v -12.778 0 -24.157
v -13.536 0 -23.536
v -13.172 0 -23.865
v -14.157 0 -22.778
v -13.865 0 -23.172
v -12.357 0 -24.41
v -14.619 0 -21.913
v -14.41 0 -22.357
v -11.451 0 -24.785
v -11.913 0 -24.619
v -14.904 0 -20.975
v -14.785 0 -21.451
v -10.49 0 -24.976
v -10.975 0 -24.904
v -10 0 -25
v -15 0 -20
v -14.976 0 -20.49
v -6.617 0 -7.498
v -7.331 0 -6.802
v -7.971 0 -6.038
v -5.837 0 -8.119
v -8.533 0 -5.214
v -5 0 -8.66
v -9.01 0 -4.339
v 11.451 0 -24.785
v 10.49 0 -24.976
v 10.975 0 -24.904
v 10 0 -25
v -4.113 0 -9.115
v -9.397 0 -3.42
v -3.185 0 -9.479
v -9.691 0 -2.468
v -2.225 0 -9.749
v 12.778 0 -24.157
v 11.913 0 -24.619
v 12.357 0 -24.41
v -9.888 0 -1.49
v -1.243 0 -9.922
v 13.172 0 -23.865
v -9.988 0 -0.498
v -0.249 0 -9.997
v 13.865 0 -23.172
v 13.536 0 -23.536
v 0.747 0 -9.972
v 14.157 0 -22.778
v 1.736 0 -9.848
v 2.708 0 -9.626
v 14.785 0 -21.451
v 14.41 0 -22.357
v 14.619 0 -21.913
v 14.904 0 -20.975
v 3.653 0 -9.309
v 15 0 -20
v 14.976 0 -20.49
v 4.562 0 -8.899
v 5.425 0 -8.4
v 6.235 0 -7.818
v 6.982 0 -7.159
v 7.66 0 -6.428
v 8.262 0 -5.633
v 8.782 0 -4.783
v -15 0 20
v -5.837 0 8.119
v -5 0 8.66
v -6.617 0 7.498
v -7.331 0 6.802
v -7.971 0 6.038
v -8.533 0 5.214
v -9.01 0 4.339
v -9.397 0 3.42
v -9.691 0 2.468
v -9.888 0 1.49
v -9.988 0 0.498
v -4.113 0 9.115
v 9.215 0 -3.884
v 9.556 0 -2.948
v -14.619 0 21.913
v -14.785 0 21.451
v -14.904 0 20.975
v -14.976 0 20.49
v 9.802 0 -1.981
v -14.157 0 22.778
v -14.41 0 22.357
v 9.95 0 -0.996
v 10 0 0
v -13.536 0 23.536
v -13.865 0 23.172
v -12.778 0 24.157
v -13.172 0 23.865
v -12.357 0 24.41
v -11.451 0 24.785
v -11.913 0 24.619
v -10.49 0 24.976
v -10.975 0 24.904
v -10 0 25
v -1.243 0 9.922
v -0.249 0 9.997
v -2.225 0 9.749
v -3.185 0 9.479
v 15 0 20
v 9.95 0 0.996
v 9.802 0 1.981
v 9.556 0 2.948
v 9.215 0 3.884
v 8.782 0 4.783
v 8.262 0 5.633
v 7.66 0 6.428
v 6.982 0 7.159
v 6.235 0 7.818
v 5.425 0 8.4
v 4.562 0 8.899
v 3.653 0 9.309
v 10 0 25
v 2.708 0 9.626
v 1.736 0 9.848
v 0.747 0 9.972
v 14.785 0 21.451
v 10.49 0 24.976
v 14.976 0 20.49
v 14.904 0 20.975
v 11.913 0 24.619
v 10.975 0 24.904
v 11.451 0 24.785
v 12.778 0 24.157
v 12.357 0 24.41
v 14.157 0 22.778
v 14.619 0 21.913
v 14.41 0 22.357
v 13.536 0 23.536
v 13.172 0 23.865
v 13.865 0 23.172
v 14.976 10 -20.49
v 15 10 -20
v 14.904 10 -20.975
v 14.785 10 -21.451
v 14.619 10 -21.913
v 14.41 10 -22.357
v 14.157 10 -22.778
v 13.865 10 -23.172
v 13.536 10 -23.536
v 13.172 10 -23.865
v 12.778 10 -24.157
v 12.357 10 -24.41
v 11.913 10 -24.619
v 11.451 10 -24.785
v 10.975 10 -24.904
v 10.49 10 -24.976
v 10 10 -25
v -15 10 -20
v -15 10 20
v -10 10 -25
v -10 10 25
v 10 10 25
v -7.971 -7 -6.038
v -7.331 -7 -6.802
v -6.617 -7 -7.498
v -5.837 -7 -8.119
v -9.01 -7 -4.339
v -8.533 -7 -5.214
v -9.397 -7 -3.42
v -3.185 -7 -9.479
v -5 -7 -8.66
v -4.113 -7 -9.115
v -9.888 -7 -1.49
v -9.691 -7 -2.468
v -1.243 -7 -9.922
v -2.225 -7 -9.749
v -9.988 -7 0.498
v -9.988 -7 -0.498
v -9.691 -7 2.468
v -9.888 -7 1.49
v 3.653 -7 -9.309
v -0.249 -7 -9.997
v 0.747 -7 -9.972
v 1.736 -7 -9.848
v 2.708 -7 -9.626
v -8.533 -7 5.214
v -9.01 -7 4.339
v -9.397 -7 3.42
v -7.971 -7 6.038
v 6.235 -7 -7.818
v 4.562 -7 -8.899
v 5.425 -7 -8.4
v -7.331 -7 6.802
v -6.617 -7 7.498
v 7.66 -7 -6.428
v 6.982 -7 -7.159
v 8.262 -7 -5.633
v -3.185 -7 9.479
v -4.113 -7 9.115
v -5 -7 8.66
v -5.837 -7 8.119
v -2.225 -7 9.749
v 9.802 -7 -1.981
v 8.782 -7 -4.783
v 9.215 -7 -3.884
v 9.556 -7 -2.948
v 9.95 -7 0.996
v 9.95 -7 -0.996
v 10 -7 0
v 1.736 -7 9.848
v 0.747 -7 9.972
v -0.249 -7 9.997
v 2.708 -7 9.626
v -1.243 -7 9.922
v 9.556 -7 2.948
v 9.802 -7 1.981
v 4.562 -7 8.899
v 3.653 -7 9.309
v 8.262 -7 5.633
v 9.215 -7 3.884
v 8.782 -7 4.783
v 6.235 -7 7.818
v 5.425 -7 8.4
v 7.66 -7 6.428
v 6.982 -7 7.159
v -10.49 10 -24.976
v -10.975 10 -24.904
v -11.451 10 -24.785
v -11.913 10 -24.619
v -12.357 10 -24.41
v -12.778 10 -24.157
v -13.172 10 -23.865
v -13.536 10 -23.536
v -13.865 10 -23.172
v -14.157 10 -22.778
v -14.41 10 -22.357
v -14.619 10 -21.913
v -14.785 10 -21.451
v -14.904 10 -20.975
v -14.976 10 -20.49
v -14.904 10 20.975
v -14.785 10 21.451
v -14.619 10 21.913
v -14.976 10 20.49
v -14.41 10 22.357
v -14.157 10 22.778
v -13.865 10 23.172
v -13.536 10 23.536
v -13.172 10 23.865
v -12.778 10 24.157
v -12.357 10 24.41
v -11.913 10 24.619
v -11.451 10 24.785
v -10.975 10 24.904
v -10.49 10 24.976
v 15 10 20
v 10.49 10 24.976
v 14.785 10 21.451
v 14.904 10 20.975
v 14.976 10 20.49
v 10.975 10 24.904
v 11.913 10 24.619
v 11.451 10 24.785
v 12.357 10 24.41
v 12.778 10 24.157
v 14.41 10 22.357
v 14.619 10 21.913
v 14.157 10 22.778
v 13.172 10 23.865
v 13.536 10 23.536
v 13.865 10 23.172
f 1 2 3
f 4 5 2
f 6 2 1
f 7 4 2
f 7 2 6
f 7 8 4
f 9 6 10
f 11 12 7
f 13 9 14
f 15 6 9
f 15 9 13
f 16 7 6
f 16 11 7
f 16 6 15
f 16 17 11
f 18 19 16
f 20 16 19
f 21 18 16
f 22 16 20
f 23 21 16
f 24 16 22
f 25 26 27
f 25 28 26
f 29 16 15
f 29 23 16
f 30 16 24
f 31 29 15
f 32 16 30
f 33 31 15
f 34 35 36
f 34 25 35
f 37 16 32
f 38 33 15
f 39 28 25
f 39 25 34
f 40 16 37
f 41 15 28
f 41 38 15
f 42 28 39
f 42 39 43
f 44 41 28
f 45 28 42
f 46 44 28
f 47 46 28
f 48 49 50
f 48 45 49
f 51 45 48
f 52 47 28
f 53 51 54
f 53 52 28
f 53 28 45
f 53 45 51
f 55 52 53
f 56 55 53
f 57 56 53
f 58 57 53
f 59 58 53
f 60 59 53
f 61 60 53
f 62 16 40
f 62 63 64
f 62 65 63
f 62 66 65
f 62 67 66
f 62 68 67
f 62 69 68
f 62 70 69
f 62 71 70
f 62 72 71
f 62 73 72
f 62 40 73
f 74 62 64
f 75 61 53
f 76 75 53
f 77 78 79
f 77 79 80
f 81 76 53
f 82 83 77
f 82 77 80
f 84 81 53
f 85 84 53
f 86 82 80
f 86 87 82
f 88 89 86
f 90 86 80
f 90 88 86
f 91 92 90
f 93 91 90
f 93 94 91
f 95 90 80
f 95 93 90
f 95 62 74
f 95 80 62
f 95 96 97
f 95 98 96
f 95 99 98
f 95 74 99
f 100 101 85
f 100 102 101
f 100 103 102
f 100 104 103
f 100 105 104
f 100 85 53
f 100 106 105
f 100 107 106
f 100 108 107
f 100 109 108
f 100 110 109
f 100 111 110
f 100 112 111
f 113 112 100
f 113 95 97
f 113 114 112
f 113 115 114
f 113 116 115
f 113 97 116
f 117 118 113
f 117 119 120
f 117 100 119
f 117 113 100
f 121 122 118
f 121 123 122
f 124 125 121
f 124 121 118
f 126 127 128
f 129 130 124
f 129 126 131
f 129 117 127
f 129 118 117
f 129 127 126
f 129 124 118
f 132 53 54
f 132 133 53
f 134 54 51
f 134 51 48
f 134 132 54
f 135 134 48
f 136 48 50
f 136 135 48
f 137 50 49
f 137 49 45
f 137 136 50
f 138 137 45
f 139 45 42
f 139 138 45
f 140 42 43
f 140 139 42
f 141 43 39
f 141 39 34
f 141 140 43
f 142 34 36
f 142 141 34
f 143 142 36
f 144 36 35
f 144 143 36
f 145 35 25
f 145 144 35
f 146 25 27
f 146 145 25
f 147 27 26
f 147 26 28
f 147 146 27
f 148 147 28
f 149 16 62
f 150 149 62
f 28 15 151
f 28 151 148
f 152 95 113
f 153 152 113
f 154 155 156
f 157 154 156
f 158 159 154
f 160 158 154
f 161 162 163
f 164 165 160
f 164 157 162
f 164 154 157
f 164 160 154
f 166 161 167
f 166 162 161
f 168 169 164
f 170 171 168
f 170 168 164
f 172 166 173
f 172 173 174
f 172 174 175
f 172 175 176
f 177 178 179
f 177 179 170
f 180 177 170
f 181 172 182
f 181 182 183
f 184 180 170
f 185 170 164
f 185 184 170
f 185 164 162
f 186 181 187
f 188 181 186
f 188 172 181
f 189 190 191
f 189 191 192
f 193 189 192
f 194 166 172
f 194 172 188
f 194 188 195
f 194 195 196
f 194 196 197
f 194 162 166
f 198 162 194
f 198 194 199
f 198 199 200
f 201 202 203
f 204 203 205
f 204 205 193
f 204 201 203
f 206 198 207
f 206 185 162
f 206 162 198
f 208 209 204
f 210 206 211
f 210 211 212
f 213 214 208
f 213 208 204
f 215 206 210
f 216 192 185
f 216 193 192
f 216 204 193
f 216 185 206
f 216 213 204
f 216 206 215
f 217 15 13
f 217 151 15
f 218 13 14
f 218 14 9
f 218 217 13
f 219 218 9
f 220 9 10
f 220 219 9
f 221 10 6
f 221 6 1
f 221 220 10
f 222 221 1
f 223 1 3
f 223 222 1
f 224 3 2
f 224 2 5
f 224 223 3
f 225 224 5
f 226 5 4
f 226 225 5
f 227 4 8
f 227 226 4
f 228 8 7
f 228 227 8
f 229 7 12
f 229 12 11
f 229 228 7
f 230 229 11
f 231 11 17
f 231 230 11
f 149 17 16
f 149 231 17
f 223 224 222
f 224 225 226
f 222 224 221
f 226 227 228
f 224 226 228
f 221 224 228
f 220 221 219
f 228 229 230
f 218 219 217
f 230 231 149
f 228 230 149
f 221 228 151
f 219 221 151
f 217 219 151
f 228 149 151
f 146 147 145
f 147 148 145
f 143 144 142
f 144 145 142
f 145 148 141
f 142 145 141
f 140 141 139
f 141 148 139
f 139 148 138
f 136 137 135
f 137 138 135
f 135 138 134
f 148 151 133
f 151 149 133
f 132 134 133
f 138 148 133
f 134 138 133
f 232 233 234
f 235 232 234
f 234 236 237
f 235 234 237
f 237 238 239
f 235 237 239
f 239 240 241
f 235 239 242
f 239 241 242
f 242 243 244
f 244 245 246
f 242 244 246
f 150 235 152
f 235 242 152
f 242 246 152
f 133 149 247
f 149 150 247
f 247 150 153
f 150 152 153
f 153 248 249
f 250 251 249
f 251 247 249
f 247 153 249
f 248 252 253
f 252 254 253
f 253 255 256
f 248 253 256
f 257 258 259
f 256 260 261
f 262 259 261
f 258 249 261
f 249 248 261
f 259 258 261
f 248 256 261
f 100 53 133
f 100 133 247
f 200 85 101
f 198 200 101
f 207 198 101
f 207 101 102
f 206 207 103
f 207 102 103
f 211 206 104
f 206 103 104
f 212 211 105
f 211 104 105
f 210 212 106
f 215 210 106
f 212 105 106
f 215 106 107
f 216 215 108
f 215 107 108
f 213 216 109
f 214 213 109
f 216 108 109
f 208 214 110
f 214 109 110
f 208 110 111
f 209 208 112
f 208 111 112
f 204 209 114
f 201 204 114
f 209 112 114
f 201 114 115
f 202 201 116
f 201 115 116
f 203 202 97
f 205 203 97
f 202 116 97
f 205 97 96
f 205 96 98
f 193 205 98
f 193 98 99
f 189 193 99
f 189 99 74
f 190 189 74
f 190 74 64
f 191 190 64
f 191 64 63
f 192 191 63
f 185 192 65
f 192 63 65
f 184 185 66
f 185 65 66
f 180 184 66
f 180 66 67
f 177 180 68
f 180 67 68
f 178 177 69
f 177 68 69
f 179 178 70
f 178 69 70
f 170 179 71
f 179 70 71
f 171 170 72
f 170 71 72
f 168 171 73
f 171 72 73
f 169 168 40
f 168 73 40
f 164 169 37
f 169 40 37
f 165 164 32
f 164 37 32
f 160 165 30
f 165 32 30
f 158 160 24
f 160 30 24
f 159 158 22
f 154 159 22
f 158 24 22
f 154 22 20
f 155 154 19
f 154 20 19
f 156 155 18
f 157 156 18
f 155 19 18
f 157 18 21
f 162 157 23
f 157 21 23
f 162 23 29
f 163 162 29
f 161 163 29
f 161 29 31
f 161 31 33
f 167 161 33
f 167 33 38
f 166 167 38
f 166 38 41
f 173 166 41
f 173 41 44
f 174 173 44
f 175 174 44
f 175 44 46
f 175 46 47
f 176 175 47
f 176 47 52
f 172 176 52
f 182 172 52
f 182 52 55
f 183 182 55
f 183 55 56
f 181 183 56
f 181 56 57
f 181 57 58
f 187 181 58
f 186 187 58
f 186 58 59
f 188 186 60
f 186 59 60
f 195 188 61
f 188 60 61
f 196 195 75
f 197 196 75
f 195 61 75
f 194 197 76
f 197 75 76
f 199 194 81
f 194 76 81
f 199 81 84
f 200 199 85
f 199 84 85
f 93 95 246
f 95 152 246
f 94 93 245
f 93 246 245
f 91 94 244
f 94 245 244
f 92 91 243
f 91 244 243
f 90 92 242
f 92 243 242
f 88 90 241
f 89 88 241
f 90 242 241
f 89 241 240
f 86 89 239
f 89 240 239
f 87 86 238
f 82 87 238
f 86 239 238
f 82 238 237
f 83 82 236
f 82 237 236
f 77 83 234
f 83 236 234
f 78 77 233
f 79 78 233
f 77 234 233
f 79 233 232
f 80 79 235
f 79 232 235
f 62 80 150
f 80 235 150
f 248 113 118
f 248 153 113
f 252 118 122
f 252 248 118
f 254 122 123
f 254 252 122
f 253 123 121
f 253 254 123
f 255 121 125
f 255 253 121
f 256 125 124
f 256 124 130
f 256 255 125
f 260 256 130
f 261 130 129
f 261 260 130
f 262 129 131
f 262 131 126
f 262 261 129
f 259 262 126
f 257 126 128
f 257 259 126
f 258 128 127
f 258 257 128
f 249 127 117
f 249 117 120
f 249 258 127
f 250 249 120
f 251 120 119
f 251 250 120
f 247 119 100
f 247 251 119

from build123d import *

# Parameters (mm, degrees)
F0_W     = 30
F0_H     = 50
F1_DEPTH = 10
F2_R     = 10
F3_DEPTH = 7
F4_R     = 5
F5_R     = 5
F6_R     = 5
F7_R     = 5


with BuildPart() as f1:
    # F0 (on Front) → F1 (new body)
    with BuildSketch(Plane.XZ):
        Rectangle(F0_W, F0_H)
    extrude(amount=-F1_DEPTH)

    # F2 (on face) → F3 (join)
    with BuildSketch(Plane.XZ):
        Circle(F2_R)
    extrude(amount=F3_DEPTH)

    # F4
    f4_edges = [f1.edges().sort_by_distance(p)[0] for p in [
        (15, 5, 25),
    ]]
    fillet(f4_edges, radius=F4_R)

    # F5
    f5_edges = [f1.edges().sort_by_distance(p)[0] for p in [
        (-15, 5, 25),
    ]]
    fillet(f5_edges, radius=F5_R)

    # F6
    f6_edges = [f1.edges().sort_by_distance(p)[0] for p in [
        (15, 5, -25),
    ]]
    fillet(f6_edges, radius=F6_R)

    # F7
    f7_edges = [f1.edges().sort_by_distance(p)[0] for p in [
        (-15, 5, -25),
    ]]
    fillet(f7_edges, radius=F7_R)


solid = f1.part
